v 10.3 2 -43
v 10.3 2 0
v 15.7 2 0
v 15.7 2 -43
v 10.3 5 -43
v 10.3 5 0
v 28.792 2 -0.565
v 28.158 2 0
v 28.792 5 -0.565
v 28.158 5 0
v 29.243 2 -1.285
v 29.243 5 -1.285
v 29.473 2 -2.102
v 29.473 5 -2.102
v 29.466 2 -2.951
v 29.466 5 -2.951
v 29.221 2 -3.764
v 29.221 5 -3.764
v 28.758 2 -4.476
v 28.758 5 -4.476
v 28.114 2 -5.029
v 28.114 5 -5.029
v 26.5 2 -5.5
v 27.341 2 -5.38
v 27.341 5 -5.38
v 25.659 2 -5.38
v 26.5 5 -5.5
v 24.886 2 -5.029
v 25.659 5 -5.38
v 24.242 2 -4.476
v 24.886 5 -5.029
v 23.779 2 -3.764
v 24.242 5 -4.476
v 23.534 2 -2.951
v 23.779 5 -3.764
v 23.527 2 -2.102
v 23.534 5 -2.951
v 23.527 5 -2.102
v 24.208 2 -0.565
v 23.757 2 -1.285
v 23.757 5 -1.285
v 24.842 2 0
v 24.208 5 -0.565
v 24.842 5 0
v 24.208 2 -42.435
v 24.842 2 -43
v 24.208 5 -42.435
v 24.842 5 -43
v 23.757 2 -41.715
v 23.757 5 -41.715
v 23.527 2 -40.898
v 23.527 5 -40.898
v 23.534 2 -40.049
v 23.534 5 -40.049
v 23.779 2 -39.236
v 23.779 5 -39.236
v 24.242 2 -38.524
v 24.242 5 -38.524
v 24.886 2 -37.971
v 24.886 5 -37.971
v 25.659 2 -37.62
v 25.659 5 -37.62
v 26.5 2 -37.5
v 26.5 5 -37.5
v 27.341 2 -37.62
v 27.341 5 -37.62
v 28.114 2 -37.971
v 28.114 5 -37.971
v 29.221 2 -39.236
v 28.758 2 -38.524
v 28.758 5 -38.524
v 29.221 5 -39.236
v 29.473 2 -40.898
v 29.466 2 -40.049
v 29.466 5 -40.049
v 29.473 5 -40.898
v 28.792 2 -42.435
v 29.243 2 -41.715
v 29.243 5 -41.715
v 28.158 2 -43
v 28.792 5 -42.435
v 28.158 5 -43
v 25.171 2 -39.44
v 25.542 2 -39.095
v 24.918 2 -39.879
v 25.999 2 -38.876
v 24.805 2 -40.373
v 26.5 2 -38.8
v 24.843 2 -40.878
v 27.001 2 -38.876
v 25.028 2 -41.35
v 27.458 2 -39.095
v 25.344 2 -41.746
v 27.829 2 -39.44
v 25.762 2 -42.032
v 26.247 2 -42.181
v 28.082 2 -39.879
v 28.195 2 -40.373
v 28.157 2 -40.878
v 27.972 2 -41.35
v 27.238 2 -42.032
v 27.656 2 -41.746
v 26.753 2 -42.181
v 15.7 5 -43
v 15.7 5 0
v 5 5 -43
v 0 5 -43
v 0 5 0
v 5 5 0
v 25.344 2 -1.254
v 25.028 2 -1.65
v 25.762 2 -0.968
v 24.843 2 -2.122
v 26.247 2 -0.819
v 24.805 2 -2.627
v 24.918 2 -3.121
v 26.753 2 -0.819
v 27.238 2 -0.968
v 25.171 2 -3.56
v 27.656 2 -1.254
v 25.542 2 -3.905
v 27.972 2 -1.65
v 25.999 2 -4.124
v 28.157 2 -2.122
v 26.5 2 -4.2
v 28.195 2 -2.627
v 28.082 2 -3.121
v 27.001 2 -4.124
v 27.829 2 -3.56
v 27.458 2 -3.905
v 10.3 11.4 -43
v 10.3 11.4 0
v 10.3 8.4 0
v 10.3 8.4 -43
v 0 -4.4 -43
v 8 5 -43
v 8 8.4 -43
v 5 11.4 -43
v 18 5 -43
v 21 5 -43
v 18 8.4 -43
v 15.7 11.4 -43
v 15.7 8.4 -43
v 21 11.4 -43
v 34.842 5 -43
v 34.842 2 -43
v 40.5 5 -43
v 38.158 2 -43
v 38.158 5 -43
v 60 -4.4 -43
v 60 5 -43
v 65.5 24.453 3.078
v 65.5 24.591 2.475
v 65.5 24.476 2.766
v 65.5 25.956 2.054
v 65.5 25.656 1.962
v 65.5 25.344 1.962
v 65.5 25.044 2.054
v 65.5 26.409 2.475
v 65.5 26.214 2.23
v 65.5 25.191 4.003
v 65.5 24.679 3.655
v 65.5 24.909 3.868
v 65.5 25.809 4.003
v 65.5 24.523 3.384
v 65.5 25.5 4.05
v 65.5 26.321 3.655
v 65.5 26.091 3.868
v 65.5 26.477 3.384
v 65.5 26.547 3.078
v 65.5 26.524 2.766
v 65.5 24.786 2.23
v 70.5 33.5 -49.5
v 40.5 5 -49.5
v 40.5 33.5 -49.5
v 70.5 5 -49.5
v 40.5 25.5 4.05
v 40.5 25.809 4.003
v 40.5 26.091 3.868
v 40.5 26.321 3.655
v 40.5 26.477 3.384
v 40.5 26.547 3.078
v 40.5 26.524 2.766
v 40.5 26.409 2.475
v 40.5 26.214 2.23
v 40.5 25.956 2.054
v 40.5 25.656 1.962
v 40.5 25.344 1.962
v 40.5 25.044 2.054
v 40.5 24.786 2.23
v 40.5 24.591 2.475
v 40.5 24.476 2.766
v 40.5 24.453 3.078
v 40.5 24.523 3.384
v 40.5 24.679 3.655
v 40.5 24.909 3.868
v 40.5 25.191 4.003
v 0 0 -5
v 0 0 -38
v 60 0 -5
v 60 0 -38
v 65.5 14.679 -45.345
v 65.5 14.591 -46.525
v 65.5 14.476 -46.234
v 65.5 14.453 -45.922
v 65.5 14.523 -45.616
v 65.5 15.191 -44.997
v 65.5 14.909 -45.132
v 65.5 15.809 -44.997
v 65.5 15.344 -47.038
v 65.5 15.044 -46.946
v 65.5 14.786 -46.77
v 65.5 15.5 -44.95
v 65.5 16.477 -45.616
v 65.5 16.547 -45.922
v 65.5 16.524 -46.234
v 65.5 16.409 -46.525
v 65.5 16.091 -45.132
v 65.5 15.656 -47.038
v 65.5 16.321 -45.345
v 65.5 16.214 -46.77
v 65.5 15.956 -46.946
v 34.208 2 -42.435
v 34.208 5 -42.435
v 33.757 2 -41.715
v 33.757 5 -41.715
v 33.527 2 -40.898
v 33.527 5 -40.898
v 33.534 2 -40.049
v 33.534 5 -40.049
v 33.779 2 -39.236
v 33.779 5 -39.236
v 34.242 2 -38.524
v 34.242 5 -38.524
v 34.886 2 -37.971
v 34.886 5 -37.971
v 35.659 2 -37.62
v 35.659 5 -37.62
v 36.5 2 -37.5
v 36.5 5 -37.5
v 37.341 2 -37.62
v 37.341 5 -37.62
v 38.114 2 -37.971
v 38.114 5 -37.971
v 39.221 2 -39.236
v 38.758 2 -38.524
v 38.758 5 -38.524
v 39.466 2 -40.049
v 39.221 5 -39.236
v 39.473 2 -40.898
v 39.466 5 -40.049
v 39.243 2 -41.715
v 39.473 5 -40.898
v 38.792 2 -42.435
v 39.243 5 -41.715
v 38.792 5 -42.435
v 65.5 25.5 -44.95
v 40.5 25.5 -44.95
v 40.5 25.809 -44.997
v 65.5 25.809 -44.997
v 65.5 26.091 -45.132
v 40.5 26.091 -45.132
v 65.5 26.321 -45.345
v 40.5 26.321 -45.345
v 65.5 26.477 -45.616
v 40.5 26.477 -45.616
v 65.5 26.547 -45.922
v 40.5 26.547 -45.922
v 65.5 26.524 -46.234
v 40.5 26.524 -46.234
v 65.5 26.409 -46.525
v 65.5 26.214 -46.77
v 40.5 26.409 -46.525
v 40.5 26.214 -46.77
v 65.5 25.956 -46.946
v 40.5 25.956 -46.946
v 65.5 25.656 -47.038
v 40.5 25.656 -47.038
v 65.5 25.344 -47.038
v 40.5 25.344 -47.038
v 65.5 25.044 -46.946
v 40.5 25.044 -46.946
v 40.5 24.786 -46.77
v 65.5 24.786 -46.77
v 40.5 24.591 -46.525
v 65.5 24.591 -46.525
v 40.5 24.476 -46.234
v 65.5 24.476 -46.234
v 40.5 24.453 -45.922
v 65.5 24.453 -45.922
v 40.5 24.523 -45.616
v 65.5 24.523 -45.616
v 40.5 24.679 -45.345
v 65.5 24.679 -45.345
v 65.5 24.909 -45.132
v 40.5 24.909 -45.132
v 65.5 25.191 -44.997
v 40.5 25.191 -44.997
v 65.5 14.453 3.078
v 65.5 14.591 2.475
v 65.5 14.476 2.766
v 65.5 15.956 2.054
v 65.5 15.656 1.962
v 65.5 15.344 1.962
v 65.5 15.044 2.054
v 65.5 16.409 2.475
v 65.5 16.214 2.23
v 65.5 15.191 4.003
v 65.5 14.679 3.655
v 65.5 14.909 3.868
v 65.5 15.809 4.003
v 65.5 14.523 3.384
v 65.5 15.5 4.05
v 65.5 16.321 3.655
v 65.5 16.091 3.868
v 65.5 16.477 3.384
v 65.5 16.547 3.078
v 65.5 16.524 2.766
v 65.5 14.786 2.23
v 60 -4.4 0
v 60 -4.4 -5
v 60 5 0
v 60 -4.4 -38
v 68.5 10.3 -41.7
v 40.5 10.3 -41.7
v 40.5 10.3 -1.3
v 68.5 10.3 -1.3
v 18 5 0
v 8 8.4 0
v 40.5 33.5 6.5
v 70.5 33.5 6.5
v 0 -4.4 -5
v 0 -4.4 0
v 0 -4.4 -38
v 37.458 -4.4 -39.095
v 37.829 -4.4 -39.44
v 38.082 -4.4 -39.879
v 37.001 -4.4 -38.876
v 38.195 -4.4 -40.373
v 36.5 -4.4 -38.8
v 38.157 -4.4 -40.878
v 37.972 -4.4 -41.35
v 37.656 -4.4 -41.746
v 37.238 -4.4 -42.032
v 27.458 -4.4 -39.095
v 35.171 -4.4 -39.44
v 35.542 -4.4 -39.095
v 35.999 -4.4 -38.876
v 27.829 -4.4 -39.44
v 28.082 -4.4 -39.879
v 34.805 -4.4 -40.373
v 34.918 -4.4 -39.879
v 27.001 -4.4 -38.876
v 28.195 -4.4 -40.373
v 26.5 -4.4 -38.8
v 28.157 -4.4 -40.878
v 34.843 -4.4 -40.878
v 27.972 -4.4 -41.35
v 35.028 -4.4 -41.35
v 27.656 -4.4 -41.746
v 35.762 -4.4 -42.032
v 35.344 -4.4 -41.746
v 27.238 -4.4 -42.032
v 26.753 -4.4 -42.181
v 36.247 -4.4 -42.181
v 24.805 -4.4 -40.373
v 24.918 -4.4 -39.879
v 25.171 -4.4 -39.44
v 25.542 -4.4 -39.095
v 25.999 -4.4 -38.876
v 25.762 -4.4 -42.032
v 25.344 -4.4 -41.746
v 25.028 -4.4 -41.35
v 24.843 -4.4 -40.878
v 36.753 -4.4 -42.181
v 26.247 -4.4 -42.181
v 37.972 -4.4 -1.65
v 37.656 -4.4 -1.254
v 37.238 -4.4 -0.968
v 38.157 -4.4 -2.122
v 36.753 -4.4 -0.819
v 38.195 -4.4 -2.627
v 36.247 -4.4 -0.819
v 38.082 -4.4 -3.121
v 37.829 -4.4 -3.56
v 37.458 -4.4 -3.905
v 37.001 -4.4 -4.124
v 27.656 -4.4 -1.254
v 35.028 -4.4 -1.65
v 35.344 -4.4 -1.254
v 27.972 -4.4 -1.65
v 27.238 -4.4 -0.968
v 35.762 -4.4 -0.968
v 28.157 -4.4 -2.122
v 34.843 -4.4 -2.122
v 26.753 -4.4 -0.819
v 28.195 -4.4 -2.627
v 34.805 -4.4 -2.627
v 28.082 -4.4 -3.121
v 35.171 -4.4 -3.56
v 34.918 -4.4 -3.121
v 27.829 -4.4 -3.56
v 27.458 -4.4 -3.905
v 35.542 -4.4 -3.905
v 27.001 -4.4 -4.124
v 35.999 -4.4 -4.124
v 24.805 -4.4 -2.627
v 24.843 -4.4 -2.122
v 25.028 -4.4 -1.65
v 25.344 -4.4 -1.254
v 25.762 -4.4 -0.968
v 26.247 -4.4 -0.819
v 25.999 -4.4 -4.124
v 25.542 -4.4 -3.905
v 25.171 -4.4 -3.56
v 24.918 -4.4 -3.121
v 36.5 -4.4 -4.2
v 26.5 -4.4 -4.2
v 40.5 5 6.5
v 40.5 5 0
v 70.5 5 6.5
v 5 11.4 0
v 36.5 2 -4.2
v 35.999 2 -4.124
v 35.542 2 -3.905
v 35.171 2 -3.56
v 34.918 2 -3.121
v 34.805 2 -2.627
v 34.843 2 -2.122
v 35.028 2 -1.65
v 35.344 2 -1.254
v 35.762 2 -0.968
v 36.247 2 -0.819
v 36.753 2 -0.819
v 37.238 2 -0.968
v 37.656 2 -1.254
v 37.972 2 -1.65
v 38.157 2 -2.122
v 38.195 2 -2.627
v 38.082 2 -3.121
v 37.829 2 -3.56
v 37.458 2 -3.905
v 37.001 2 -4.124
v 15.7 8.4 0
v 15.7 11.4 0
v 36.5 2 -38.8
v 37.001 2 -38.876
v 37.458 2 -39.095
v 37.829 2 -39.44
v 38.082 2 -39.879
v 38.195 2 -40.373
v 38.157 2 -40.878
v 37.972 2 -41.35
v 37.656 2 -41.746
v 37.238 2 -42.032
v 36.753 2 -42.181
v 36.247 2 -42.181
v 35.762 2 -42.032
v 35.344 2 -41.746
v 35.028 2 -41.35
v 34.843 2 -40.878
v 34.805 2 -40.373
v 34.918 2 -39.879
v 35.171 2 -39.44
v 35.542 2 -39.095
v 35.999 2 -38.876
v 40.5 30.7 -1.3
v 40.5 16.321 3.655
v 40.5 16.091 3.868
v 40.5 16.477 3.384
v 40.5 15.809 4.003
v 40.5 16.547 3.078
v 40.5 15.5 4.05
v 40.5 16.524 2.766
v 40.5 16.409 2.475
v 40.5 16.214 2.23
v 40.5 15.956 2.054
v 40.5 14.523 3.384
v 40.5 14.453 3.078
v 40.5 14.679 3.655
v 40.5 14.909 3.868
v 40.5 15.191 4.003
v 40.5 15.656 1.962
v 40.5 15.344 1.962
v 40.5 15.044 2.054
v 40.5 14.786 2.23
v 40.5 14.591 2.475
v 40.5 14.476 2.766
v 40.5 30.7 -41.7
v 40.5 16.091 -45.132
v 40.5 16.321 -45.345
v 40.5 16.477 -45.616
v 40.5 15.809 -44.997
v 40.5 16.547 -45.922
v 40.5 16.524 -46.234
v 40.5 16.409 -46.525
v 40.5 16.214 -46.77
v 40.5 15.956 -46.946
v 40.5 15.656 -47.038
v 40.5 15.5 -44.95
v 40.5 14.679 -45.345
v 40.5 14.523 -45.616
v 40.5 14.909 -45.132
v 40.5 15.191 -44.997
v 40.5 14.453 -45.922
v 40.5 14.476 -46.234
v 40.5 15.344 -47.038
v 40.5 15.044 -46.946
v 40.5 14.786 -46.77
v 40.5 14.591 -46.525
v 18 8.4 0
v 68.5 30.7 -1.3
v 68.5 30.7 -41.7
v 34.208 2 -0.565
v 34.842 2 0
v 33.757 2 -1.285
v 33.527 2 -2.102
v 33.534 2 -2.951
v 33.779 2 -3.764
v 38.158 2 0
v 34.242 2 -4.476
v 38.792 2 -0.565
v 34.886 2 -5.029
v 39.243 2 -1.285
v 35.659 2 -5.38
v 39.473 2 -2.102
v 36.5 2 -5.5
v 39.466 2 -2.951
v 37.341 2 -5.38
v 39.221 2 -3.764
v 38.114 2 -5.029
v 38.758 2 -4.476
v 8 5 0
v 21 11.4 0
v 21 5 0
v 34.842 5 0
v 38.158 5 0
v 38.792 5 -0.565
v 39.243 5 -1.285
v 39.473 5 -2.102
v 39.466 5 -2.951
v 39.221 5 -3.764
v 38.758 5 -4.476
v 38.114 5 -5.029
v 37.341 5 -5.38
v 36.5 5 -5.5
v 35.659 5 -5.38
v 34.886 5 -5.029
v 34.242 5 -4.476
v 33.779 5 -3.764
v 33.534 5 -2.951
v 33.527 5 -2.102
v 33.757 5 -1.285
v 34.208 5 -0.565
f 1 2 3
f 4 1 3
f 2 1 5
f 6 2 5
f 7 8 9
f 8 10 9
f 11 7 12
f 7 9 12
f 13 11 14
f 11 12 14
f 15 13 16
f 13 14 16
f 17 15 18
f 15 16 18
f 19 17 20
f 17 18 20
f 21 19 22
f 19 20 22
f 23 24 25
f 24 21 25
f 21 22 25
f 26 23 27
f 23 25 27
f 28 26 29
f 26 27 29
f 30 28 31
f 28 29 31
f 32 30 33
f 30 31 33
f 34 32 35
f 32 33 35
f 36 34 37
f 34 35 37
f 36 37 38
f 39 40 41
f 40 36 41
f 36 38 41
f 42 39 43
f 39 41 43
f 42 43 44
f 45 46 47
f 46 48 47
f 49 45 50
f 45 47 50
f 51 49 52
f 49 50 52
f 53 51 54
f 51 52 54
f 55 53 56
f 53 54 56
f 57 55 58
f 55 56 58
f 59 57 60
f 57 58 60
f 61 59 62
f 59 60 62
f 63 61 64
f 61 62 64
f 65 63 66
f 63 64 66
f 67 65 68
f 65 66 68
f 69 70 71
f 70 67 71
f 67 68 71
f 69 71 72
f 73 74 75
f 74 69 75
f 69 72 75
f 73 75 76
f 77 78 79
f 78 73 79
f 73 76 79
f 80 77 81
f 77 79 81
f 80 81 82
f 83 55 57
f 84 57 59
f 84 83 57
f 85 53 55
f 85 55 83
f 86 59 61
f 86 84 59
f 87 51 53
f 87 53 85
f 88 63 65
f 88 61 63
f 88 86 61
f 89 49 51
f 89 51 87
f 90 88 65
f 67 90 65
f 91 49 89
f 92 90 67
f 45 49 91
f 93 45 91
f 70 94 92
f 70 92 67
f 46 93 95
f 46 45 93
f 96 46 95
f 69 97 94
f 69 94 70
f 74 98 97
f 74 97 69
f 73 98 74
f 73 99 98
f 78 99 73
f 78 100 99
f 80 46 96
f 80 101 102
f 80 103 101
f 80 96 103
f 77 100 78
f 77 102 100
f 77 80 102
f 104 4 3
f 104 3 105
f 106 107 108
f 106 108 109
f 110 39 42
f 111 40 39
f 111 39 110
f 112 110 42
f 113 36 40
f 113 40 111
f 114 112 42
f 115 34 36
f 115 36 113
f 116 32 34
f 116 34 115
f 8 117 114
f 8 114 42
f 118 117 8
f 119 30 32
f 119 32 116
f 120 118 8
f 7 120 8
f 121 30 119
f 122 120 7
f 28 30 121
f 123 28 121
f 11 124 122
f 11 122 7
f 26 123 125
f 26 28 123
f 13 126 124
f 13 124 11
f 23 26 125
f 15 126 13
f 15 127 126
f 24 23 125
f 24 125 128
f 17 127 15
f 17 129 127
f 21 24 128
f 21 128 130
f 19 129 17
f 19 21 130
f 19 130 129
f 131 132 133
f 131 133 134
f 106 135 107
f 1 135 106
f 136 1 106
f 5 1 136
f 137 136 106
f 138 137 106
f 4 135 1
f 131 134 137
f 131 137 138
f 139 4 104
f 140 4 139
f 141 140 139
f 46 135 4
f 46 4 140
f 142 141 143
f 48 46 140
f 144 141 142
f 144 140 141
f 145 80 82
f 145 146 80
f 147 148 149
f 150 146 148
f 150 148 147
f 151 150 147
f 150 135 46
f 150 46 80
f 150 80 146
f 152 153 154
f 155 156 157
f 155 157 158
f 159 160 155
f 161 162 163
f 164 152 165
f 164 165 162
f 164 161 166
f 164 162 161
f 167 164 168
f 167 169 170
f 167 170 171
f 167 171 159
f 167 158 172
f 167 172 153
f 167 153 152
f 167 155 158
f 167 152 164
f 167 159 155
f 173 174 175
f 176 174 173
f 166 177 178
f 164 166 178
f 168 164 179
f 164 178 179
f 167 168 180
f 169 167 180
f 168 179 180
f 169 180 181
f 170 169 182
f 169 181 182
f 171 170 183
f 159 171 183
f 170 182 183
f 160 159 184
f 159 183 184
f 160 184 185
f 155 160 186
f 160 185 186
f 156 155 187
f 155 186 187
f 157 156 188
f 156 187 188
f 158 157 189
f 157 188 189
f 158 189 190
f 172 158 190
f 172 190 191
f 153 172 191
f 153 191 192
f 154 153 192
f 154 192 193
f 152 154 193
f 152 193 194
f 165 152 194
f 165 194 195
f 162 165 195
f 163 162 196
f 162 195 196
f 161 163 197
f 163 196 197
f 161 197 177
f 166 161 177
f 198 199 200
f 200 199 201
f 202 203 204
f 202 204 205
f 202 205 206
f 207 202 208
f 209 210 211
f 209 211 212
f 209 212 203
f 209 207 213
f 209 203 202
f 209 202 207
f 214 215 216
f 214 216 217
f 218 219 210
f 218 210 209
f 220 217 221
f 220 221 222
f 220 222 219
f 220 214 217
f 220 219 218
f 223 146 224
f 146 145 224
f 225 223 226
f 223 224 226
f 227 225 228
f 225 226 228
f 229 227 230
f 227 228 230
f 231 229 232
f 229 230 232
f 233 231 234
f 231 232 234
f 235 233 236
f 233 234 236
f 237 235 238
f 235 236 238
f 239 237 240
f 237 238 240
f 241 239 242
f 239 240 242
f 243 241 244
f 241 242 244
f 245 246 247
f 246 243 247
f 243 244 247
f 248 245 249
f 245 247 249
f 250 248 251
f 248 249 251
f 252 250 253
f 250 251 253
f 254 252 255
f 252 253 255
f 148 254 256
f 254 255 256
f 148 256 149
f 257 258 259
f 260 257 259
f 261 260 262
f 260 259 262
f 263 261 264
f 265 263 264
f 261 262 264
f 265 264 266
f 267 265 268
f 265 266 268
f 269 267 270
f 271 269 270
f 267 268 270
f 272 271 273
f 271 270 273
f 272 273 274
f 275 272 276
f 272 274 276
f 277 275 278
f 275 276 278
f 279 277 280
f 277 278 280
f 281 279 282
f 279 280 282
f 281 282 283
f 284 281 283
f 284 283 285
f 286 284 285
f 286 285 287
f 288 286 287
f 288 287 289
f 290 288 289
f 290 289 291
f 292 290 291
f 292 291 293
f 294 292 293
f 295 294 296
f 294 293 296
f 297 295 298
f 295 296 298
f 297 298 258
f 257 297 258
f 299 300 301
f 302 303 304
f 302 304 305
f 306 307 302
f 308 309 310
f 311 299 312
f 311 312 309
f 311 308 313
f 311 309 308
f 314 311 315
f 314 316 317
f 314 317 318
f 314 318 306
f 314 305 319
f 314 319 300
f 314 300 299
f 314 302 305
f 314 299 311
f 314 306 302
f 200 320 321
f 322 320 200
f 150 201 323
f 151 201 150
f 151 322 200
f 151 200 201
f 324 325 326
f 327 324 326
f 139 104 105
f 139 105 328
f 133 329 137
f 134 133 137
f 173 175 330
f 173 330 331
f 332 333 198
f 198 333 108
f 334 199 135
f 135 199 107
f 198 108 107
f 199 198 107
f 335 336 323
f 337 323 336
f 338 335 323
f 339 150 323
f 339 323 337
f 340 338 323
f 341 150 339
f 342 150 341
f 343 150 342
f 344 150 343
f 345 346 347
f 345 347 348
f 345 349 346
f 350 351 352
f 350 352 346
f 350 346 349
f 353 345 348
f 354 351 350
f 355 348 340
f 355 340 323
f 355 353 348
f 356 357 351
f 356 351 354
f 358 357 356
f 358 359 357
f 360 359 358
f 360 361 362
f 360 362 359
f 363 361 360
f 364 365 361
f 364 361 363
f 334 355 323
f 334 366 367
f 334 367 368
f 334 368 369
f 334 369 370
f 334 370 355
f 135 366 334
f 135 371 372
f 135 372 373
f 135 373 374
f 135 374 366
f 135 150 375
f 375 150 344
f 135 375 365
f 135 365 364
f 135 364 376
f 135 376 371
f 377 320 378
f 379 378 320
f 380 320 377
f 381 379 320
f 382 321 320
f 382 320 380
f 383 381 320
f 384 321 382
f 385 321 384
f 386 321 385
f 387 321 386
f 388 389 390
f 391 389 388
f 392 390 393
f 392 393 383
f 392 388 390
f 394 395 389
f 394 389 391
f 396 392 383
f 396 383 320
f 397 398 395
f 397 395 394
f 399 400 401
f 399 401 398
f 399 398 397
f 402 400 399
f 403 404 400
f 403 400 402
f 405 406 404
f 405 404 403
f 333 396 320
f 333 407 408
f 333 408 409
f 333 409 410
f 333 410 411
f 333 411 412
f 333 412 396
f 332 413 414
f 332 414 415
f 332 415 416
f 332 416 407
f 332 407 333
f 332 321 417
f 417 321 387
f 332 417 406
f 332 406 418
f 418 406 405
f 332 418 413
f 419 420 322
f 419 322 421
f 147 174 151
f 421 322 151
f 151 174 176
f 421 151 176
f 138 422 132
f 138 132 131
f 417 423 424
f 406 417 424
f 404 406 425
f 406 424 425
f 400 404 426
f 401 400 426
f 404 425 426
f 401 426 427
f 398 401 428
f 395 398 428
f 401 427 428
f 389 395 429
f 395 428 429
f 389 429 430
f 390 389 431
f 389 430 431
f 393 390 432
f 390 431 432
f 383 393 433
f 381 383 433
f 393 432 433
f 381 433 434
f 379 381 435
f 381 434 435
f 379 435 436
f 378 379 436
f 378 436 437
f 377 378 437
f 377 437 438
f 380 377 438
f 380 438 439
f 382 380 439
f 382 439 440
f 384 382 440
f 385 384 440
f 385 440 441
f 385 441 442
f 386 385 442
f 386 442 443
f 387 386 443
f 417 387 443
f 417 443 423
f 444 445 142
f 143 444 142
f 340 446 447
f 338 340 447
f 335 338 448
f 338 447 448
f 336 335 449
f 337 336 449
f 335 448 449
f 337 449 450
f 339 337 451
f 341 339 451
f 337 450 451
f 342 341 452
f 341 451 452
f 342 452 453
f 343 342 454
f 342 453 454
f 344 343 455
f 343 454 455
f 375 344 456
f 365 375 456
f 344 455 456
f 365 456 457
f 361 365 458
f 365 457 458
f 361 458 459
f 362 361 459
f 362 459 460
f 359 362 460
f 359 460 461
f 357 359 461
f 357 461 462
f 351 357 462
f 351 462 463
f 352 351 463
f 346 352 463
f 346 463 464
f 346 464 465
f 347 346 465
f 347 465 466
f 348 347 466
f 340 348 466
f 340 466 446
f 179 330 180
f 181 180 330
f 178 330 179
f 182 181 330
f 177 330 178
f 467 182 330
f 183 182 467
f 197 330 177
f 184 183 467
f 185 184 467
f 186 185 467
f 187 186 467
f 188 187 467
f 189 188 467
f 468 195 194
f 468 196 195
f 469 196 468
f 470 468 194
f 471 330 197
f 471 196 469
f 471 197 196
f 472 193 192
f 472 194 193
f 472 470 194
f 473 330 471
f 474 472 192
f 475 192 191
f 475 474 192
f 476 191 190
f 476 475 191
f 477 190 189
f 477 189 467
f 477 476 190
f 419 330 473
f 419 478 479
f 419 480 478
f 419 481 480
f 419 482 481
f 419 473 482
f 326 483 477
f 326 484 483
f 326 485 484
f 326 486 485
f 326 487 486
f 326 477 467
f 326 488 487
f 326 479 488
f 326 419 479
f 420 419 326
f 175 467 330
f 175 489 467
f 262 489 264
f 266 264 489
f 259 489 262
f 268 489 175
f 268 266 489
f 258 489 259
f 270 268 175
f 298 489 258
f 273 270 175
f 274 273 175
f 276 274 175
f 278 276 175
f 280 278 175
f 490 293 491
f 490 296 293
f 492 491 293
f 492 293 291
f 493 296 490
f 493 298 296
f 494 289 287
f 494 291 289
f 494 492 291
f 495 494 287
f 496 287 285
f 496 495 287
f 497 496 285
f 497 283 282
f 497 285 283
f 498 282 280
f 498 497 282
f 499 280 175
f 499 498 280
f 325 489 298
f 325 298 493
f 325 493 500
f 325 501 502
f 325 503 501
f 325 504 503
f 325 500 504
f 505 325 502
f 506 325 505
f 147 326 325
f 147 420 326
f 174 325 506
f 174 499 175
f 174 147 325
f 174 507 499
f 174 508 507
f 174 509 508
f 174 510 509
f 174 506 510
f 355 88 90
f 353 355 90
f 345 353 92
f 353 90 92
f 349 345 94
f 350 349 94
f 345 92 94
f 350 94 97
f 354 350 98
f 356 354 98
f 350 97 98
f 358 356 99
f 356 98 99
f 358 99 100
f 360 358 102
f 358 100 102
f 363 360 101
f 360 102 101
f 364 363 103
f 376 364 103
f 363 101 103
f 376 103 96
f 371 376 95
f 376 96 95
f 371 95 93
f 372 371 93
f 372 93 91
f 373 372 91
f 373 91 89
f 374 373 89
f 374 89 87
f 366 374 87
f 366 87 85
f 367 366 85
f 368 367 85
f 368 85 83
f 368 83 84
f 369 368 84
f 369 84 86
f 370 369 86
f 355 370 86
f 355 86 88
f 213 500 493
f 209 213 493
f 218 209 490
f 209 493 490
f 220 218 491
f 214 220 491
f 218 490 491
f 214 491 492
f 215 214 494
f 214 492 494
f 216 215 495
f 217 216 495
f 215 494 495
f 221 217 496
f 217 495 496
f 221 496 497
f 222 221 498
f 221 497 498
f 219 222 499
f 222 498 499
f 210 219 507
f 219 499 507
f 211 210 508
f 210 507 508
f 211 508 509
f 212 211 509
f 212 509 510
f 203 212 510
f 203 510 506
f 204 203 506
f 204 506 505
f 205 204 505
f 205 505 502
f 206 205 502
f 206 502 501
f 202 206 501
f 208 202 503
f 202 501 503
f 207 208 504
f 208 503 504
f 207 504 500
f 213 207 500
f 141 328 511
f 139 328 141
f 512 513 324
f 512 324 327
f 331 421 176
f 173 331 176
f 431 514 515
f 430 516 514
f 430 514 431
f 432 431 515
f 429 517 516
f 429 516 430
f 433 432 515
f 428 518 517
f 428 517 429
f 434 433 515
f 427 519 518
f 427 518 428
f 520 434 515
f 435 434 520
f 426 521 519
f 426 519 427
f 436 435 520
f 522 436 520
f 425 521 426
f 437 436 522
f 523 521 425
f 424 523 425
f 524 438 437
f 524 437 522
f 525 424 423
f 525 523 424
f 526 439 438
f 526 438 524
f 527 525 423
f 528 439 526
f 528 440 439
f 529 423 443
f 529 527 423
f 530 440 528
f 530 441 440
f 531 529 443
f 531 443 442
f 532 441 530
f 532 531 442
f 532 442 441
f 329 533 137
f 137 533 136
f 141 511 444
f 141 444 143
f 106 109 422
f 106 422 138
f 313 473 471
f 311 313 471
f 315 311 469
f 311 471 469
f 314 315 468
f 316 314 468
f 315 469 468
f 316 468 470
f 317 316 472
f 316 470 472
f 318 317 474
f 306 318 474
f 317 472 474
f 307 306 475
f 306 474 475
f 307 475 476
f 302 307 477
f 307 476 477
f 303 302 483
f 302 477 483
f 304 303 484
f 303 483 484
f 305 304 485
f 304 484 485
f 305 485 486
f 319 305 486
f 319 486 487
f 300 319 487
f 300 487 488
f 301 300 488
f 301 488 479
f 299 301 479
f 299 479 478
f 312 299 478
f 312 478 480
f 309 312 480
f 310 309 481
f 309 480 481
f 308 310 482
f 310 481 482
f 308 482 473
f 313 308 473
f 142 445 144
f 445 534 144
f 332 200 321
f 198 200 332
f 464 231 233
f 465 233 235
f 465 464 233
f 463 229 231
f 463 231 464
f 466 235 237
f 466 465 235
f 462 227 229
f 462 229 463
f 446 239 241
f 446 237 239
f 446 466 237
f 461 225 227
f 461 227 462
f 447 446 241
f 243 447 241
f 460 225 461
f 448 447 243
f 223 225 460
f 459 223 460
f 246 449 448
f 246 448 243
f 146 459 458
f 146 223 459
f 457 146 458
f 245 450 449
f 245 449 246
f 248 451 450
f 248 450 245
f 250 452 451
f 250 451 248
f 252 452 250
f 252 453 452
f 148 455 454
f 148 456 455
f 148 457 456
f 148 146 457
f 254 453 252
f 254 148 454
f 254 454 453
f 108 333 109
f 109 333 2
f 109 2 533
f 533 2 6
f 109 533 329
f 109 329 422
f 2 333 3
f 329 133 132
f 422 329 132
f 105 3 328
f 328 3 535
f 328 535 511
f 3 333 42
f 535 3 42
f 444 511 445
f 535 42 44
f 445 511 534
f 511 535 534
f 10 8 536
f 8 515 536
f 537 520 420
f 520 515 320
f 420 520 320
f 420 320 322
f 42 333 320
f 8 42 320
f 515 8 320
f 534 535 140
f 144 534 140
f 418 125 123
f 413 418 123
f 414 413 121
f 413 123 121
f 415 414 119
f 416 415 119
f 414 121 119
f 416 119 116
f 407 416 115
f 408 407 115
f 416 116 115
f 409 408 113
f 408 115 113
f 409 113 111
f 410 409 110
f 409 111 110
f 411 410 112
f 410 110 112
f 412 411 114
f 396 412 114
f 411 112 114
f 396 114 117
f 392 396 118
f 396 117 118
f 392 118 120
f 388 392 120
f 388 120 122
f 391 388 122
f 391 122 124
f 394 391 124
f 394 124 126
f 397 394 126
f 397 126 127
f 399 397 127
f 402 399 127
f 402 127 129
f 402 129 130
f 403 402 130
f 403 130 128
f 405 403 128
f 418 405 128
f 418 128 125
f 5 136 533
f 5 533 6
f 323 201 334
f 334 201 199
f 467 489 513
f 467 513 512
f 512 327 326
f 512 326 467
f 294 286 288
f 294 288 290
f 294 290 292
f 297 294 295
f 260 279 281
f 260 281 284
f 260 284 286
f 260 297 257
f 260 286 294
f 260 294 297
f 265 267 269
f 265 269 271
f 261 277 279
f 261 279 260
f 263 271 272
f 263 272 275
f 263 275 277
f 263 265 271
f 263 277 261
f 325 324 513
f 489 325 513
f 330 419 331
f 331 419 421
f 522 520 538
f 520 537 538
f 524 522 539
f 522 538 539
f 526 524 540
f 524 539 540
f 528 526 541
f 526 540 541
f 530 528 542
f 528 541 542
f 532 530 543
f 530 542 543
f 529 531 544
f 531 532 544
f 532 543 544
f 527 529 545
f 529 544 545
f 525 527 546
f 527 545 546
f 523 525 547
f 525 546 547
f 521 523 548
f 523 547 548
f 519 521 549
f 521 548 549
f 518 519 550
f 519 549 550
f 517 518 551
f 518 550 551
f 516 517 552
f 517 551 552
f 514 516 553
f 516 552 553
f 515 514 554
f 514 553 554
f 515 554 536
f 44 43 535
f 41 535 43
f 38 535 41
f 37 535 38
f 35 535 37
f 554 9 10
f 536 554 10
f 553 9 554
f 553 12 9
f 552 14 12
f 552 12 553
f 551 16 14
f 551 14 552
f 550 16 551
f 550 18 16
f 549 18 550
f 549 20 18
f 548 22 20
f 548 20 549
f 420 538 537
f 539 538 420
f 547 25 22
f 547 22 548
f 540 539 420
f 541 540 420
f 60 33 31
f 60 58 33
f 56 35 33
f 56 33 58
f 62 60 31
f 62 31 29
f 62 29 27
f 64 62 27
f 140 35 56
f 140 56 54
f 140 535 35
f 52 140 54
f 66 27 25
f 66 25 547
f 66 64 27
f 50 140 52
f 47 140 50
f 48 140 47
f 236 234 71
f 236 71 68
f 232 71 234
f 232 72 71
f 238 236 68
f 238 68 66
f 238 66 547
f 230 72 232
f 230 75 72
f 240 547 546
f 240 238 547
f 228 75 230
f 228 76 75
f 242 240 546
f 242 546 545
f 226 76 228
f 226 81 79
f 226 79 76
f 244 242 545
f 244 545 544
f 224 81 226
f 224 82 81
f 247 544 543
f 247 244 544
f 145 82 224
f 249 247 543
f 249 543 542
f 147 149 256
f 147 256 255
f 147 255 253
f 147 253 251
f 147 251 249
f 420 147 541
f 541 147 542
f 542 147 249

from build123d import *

# Parameters (mm, degrees)
SKETCH1_W           = 60
SKETCH1_H           = 43
BOSS_EXTRUDE1_DEPTH = 5
SKETCH2_W           = 60
SKETCH2_H           = 5
BOSS_EXTRUDE2_DEPTH = 4.4
SKETCH3_W           = 3
SKETCH3_H           = 43
BOSS_EXTRUDE3_DEPTH = 6.4
SKETCH4_W           = 43
SKETCH4_H           = 3
BOSS_EXTRUDE4_DEPTH = 2.3
SKETCH5_W           = 30
SKETCH5_H           = 56
BOSS_EXTRUDE5_DEPTH = 28.5
SKETCH6_W           = 40.4
SKETCH6_H           = 20.4
CUT_EXTRUDE1_DEPTH  = 28
SKETCH7_R           = 1.05
CUT_EXTRUDE2_DEPTH  = 25
CUT_EXTRUDE3_REACH  = 94.427
SKETCH8_W           = 5.4
SKETCH8_H           = 3
CUT_EXTRUDE4_REACH  = 92.735
SKETCH9_R           = 1.7
SKETCH10_R          = 3
CUT_EXTRUDE5_DEPTH  = 3


with BuildPart() as part:
    # Sketch1 → Boss-Extrude1 (new body)
    with BuildSketch(Plane(origin=(0, 0, 0), x_dir=(1, 0, 0), z_dir=(0, 1, 0))):
        with Locations((30, 21.5)):
            Rectangle(SKETCH1_W, SKETCH1_H)
    extrude(amount=BOSS_EXTRUDE1_DEPTH)

    # Sketch2 → Boss-Extrude2 (add)
    with BuildSketch(Plane(origin=(0, 0, 0), x_dir=(-1, 0, 0), z_dir=(0, -1, 0))):
        with Locations((-30, 2.5)):
            Rectangle(SKETCH2_W, SKETCH2_H)
        with Locations((-30, 40.5)):
            Rectangle(SKETCH2_W, SKETCH2_H)
    extrude(amount=BOSS_EXTRUDE2_DEPTH)

    # Sketch3 → Boss-Extrude3 (add)
    with BuildSketch(Plane(origin=(0, 5, 0), x_dir=(1, 0, 0), z_dir=(0, 1, 0))):
        with Locations((6.5, 21.5)):
            Rectangle(SKETCH3_W, SKETCH3_H)
        with Locations((19.5, 21.5)):
            Rectangle(SKETCH3_W, SKETCH3_H)
    extrude(amount=BOSS_EXTRUDE3_DEPTH)

    # Sketch4 → Boss-Extrude4 (add)
    with BuildSketch(Plane(origin=(8, 0, 0), x_dir=(0, 0, -1), z_dir=(1, 0, 0))):
        with Locations((21.5, 9.9)):
            Rectangle(SKETCH4_W, SKETCH4_H)
    boss_extrude4 = extrude(amount=BOSS_EXTRUDE4_DEPTH)

    # Mirror1: Boss-Extrude4 across plane
    add(boss_extrude4.mirror(Plane(origin=(13, 0, 0), x_dir=(0, 0, 1), z_dir=(1, 0, 0))))

    # Sketch5 → Boss-Extrude5 (add)
    with BuildSketch(Plane(origin=(0, 5, 0), x_dir=(1, 0, 0), z_dir=(0, 1, 0))):
        with Locations((55.5, 21.5)):
            Rectangle(SKETCH5_W, SKETCH5_H)
    extrude(amount=BOSS_EXTRUDE5_DEPTH)

    # Sketch6 → Cut-Extrude1 (cut)
    with BuildSketch(Plane.ZY.offset(-40.5)):
        with Locations((-21.5, 20.5)):
            Rectangle(SKETCH6_W, SKETCH6_H)
    extrude(amount=-CUT_EXTRUDE1_DEPTH, mode=Mode.SUBTRACT)

    # Sketch7 → Cut-Extrude2 (cut)
    with BuildSketch(Plane.ZY.offset(-40.5)):
        with Locations((-46, 25.5)):
            Circle(SKETCH7_R)
        with Locations((-46, 15.5)):
            Circle(SKETCH7_R)
        with Locations((3, 25.5)):
            Circle(SKETCH7_R)
        with Locations((3, 15.5)):
            Circle(SKETCH7_R)
    extrude(amount=-CUT_EXTRUDE2_DEPTH, mode=Mode.SUBTRACT)

    # Sketch8 → Cut-Extrude3 (cut, up to next)
    with BuildSketch(Plane.XY, mode=Mode.PRIVATE) as cut_extrude3_sk1:
        with Locations((13, 3.5)):
            Rectangle(SKETCH8_W, SKETCH8_H)
    cut_extrude3_tool1 = extrude(cut_extrude3_sk1.sketch, amount=-CUT_EXTRUDE3_REACH, mode=Mode.PRIVATE) & part.part
    add(cut_extrude3_tool1.solids().sort_by_distance((13, 3.5, 0))[0], mode=Mode.SUBTRACT)

    # Sketch9 → Cut-Extrude4 (cut, up to next)
    with BuildSketch(Plane(origin=(0, 5, 0), x_dir=(1, 0, 0), z_dir=(0, 1, 0)), mode=Mode.PRIVATE) as cut_extrude4_sk1:
        with Locations(Location((26.5, 40.5, 0), (0, 0, 270))):
            Circle(SKETCH9_R)
    cut_extrude4_tool1 = extrude(cut_extrude4_sk1.sketch, amount=-CUT_EXTRUDE4_REACH, mode=Mode.PRIVATE) & part.part
    # Sketch9 → Cut-Extrude4 (cut, up to next)
    with BuildSketch(Plane(origin=(0, 5, 0), x_dir=(1, 0, 0), z_dir=(0, 1, 0)), mode=Mode.PRIVATE) as cut_extrude4_sk2:
        with Locations(Location((36.5, 40.5, 0), (0, 0, 270))):
            Circle(SKETCH9_R)
    cut_extrude4_tool2 = extrude(cut_extrude4_sk2.sketch, amount=-CUT_EXTRUDE4_REACH, mode=Mode.PRIVATE) & part.part
    # Sketch9 → Cut-Extrude4 (cut, up to next)
    with BuildSketch(Plane(origin=(0, 5, 0), x_dir=(1, 0, 0), z_dir=(0, 1, 0)), mode=Mode.PRIVATE) as cut_extrude4_sk3:
        with Locations(Location((36.5, 2.5, 0), (0, 0, 90))):
            Circle(SKETCH9_R)
    cut_extrude4_tool3 = extrude(cut_extrude4_sk3.sketch, amount=-CUT_EXTRUDE4_REACH, mode=Mode.PRIVATE) & part.part
    # Sketch9 → Cut-Extrude4 (cut, up to next)
    with BuildSketch(Plane(origin=(0, 5, 0), x_dir=(1, 0, 0), z_dir=(0, 1, 0)), mode=Mode.PRIVATE) as cut_extrude4_sk4:
        with Locations(Location((26.5, 2.5, 0), (0, 0, 90))):
            Circle(SKETCH9_R)
    cut_extrude4_tool4 = extrude(cut_extrude4_sk4.sketch, amount=-CUT_EXTRUDE4_REACH, mode=Mode.PRIVATE) & part.part
    add(cut_extrude4_tool1.solids().sort_by_distance((26.5, 5, -40.5))[0], mode=Mode.SUBTRACT)
    add(cut_extrude4_tool2.solids().sort_by_distance((36.5, 5, -40.5))[0], mode=Mode.SUBTRACT)
    add(cut_extrude4_tool3.solids().sort_by_distance((36.5, 5, -2.5))[0], mode=Mode.SUBTRACT)
    add(cut_extrude4_tool4.solids().sort_by_distance((26.5, 5, -2.5))[0], mode=Mode.SUBTRACT)

    # Sketch10 → Cut-Extrude5 (cut)
    with BuildSketch(Plane(origin=(0, 5, 0), x_dir=(1, 0, 0), z_dir=(0, 1, 0))):
        with Locations((26.5, 40.5)):
            Circle(SKETCH10_R)
        with Locations((36.5, 40.5)):
            Circle(SKETCH10_R)
        with Locations((26.5, 2.5)):
            Circle(SKETCH10_R)
        with Locations((36.5, 2.5)):
            Circle(SKETCH10_R)
    extrude(amount=-CUT_EXTRUDE5_DEPTH, mode=Mode.SUBTRACT)


solid = part.part
